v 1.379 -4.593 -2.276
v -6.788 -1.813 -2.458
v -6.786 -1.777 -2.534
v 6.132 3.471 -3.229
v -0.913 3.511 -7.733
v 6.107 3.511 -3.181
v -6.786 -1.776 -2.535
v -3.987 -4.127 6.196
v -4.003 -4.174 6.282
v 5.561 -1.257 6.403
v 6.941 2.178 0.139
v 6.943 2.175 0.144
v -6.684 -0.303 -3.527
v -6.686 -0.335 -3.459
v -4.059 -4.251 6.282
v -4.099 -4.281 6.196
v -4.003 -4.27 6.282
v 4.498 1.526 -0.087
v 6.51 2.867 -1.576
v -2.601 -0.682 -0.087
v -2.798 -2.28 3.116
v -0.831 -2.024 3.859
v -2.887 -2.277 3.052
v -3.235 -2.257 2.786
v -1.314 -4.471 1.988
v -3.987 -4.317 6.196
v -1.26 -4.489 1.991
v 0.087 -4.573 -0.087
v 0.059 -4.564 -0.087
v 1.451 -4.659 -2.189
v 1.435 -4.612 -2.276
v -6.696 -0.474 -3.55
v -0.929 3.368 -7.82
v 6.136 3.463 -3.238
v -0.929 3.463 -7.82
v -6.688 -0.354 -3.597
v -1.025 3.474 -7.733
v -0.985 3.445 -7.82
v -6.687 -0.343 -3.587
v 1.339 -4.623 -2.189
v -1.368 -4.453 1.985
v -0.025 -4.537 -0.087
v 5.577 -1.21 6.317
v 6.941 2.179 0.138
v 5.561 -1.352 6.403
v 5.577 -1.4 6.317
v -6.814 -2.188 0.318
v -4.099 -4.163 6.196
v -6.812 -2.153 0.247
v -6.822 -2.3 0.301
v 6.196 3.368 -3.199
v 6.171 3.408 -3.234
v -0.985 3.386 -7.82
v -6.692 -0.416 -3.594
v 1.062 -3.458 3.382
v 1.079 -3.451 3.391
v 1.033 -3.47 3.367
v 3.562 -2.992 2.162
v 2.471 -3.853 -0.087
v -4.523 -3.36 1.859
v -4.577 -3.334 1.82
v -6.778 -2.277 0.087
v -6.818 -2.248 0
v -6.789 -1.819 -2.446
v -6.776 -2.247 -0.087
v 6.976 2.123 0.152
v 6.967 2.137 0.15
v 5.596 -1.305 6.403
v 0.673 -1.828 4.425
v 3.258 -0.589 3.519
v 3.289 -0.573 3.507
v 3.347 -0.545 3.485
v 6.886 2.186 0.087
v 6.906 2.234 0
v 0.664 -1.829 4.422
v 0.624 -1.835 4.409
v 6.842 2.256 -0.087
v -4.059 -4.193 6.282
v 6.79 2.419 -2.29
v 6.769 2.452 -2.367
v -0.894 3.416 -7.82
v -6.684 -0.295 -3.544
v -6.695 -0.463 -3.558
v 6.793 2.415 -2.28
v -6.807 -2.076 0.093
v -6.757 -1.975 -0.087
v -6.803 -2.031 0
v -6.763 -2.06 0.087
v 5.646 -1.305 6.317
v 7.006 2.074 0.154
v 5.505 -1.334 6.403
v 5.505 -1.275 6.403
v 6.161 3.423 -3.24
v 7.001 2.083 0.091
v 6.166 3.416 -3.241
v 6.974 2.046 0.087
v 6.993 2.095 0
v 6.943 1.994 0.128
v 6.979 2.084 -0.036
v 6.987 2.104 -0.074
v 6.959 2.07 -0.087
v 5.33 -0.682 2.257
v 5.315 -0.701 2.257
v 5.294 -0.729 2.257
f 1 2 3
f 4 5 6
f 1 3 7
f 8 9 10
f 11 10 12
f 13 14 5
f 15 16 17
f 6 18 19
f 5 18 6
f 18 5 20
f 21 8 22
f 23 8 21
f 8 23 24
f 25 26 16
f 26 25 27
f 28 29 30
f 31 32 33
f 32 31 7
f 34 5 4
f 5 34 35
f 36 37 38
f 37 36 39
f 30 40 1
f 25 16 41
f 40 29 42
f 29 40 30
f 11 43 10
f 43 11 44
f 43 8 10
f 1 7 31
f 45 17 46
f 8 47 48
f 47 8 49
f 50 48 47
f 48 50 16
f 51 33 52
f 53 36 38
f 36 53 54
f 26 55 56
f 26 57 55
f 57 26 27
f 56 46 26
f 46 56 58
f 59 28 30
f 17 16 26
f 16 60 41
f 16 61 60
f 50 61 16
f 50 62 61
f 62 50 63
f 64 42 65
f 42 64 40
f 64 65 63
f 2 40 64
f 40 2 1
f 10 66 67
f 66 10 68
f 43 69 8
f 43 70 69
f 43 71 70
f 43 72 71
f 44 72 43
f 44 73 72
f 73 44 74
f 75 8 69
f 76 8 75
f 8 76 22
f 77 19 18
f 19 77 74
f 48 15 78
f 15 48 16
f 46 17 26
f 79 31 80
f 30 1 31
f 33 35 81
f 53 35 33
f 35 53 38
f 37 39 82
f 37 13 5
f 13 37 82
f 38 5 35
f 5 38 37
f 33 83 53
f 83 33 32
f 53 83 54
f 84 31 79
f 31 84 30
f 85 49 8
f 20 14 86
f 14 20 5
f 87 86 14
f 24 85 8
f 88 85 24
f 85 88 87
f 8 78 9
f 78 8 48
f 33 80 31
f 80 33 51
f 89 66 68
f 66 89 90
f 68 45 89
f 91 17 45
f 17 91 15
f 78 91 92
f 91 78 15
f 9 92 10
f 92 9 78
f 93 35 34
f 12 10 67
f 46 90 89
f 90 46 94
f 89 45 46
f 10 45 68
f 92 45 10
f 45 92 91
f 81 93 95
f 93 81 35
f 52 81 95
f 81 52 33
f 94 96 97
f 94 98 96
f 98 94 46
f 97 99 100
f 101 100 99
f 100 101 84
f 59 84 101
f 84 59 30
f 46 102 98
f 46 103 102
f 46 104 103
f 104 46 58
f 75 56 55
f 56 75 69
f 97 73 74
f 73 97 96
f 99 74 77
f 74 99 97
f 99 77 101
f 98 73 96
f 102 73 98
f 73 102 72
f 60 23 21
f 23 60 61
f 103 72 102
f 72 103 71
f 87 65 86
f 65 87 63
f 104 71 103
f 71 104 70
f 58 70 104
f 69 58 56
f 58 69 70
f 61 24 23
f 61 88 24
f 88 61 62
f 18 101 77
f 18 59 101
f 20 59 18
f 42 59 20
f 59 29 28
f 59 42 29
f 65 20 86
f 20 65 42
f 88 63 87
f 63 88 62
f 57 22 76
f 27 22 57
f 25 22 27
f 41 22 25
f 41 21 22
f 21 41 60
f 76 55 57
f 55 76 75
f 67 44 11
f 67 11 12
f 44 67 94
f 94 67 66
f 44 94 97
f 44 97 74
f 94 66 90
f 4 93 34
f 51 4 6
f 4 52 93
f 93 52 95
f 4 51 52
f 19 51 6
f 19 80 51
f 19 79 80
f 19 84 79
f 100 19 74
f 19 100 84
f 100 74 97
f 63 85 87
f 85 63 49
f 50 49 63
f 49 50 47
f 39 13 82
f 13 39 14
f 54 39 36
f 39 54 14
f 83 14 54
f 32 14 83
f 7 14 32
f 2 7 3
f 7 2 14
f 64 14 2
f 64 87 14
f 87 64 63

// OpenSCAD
// Auto-generated OpenSCAD file

    inner_points = 10*[[0.23620735966763612, -0.8589852711237532, 6.281120552158003e-15], [0.3476109579235432, 0.7552090254358436, 7.186745320395964e-14], [-0.6913160481523587, -0.48522020059684634, -1.2256510252105723e-13], [-0.6224648379611696, 0.5124067391232119, -8.203051974478681e-14], [0.8782995612527119, -0.092357848796825, 1.2644704850972638e-13], [0.0296673985459932, -0.03378951119168972, 0.5257311121191336]];

    outer_points = 10*[[0.5545913541974953, -0.130465753147186, 0.6316754822336427], [-0.8029377257364648, -0.130465753147186, -0.24874986149718784], [0.7445891768936461, 0.3415637761071865, -0.22918975163436395], [-0.09440993522191399, 0.3415637761071865, -0.7733225386168263], [-0.4018328701327624, -0.422196045920001, 0.6195866695147354], [0.14198138773148855, -0.4564076590866669, -0.2189213021039538]];

    // Convex hull for inner set (I)
    module inner_hull() {
        hull() {
            for (p = inner_points) {
                translate(p) sphere(r=0.1);
            }
        }
    }

    // Convex hull for outer set (O) minus inner hull (O \ I)
    module outer_minus_inner() {
        difference() {
            hull() {
                for (p = outer_points) {
                    translate(p) sphere(r=0.1);
                }
            }
            inner_hull(); // Subtract inner hull
        }
    }

    // Convex hull for outer set (O) minus all translated inner hulls
    module outer_minus_AllTranslationInner() {
        difference() {
            hull() {
                for (p = outer_points) {
                    translate(p) sphere(r=0.1);
                }
            }
            hull() {
                translate([0,0,50]) inner_hull();
                translate([0,0,-50]) inner_hull();
            }; // Subtract translated inner hulls
        }
    }

    // Difference between outer_minus_inner and outer_minus_AllTranslationInner
    module outer_minus_inner_diff() {
        difference() {
            // Outer minus inner
            difference() {
                hull() {
                    for (p = outer_points) {
                        translate(p) sphere(r=0.1);
                    }
                }
                inner_hull();
            }

            // Subtract Outer minus AllTranslationInner
            difference() {
                hull() {
                    for (p = outer_points) {
                        translate(p) sphere(r=0.1);
                    }
                }
                hull() {
                    translate([0,0,50]) inner_hull();
                    translate([0,0,-50]) inner_hull();
                };
            }
        }
    }

    // Rendering all with colors applied
    color([1, 1, 0, 1]) outer_minus_inner_diff(); // Opaque yellow
    
